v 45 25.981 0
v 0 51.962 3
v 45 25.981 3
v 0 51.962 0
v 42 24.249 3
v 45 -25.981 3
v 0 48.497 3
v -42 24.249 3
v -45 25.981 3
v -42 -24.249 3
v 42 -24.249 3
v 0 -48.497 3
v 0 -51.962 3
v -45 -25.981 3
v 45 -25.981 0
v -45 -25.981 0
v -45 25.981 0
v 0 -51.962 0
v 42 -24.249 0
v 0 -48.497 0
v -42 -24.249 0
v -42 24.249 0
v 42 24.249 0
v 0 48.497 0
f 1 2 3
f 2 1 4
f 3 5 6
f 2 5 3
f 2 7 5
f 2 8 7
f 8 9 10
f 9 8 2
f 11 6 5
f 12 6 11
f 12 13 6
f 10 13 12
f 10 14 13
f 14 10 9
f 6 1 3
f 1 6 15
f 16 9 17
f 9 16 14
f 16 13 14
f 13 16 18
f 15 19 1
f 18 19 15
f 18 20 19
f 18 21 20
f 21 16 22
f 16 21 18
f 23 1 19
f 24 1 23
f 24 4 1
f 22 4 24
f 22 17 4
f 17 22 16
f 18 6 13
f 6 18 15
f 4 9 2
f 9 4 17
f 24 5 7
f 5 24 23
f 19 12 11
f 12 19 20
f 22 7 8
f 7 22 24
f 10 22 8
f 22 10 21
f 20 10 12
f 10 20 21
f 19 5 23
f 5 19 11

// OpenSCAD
// Float for seven 15 mL conical tubes
// Dimensions measured with calipers

// Plate dimensions
plate_across_flats = 90;   // mm, across flats
plate_thickness = 3;       // mm, z = 0 to 3
plate_wall = 2;            // mm, skirt wall thickness

// Hole dimensions
hole_diameter = 17.5;      // mm, through-hole diameter
hole_radius = hole_diameter / 2;
sleeve_wall = 2;           // mm, sleeve wall thickness
sleeve_outer_diameter = hole_diameter + 2 * sleeve_wall; // 21.5 mm
sleeve_height = 20;        // mm, sleeve rises to z = 20

// Hole positions
center_hole_offset = 0;    // mm, from origin
circle_diameter = 54;      // mm, diameter of circle for six outer holes
circle_radius = circle_diameter / 2; // 27 mm

// Skirt dimensions
skirt_across_flats = 84;   // mm, across flats outside (3 mm in from plate edge)
skirt_height = 20;         // mm, rises to z = 20

// Quality
$fn = 64;

// Helper: regular hexagon across flats, two flats parallel to X axis
module hex_across_flats(across_flats, height) {
    // A hexagon with two flats parallel to X axis has vertices at angles
    // 30, 90, 150, 210, 270, 330 degrees from the center.
    // The distance from center to each flat is across_flats/2.
    // The distance from center to each vertex is across_flats / sqrt(3).
    r = across_flats / sqrt(3);
    linear_extrude(height = height, convexity = 10)
    polygon(points = [
        [r * cos(30),  r * sin(30)],
        [r * cos(90),  r * sin(90)],
        [r * cos(150), r * sin(150)],
        [r * cos(210), r * sin(210)],
        [r * cos(270), r * sin(270)],
        [r * cos(330), r * sin(330)]
    ]);
}

// Build the float
difference() {
    // Solid plate
    hex_across_flats(plate_across_flats, plate_thickness);

    // Solid skirt (hexagonal, 2 mm wall, 84 mm across flats outside)
    // The skirt is a hollow hexagonal prism.
    // Outer hexagon: 84 mm across flats
    // Inner hexagon: 84 - 2*2 = 80 mm across flats
    translate([0, 0, 0])
    hex_across_flats(skirt_across_flats, skirt_height);

    // Remove the inner part of the skirt to make it hollow (2 mm wall)
    // Inner across flats = 84 - 2*2 = 80
    inner_skirt_across_flats = skirt_across_flats - 2 * plate_wall;
    translate([0, 0, -0.01]) // extend slightly below to ensure clean cut
    hex_across_flats(inner_skirt_across_flats, skirt_height + 0.02);

    // Solid sleeves around each hole
    // Seven sleeves: one at center, six on 54 mm diameter circle
    // Sleeve outer diameter = 21.5 mm, height = 20 mm
    // Sleeve inner diameter = 17.5 mm (matches hole)
    
    // Center sleeve
    translate([0, 0, 0])
    cylinder(h = sleeve_height, r = sleeve_outer_diameter / 2, $fn = $fn);

    // Six outer sleeves
    for (i = [0:5]) {
        angle = i * 60; // degrees, first on +X axis
        x = circle_radius * cos(angle);
        y = circle_radius * sin(angle);
        translate([x, y, 0])
        cylinder(h = sleeve_height, r = sleeve_outer_diameter / 2, $fn = $fn);
    }

    // Cut through-holes in the plate (17.5 mm diameter)
    // Center hole
    translate([0, 0, -0.01])
    cylinder(h = plate_thickness + 0.02, r = hole_radius, $fn = $fn);

    // Six outer holes
    for (i = [0:5]) {
        angle = i * 60;
        x = circle_radius * cos(angle);
        y = circle_radius * sin(angle);
        translate([x, y, -0.01])
        cylinder(h = plate_thickness + 0.02, r = hole_radius, $fn = $fn);
    }

    // Cut out the inside of the sleeves (to make them hollow with 2 mm wall)
    // Center sleeve inner cut
    translate([0, 0, -0.01])
    cylinder(h = sleeve_height + 0.02, r = hole_radius, $fn = $fn);

    // Six outer sleeve inner cuts
    for (i = [0:5]) {
        angle = i * 60;
        x = circle_radius * cos(angle);
        y = circle_radius * sin(angle);
        translate([x, y, -0.01])
        cylinder(h = sleeve_height + 0.02, r = hole_radius, $fn = $fn);
    }
}
